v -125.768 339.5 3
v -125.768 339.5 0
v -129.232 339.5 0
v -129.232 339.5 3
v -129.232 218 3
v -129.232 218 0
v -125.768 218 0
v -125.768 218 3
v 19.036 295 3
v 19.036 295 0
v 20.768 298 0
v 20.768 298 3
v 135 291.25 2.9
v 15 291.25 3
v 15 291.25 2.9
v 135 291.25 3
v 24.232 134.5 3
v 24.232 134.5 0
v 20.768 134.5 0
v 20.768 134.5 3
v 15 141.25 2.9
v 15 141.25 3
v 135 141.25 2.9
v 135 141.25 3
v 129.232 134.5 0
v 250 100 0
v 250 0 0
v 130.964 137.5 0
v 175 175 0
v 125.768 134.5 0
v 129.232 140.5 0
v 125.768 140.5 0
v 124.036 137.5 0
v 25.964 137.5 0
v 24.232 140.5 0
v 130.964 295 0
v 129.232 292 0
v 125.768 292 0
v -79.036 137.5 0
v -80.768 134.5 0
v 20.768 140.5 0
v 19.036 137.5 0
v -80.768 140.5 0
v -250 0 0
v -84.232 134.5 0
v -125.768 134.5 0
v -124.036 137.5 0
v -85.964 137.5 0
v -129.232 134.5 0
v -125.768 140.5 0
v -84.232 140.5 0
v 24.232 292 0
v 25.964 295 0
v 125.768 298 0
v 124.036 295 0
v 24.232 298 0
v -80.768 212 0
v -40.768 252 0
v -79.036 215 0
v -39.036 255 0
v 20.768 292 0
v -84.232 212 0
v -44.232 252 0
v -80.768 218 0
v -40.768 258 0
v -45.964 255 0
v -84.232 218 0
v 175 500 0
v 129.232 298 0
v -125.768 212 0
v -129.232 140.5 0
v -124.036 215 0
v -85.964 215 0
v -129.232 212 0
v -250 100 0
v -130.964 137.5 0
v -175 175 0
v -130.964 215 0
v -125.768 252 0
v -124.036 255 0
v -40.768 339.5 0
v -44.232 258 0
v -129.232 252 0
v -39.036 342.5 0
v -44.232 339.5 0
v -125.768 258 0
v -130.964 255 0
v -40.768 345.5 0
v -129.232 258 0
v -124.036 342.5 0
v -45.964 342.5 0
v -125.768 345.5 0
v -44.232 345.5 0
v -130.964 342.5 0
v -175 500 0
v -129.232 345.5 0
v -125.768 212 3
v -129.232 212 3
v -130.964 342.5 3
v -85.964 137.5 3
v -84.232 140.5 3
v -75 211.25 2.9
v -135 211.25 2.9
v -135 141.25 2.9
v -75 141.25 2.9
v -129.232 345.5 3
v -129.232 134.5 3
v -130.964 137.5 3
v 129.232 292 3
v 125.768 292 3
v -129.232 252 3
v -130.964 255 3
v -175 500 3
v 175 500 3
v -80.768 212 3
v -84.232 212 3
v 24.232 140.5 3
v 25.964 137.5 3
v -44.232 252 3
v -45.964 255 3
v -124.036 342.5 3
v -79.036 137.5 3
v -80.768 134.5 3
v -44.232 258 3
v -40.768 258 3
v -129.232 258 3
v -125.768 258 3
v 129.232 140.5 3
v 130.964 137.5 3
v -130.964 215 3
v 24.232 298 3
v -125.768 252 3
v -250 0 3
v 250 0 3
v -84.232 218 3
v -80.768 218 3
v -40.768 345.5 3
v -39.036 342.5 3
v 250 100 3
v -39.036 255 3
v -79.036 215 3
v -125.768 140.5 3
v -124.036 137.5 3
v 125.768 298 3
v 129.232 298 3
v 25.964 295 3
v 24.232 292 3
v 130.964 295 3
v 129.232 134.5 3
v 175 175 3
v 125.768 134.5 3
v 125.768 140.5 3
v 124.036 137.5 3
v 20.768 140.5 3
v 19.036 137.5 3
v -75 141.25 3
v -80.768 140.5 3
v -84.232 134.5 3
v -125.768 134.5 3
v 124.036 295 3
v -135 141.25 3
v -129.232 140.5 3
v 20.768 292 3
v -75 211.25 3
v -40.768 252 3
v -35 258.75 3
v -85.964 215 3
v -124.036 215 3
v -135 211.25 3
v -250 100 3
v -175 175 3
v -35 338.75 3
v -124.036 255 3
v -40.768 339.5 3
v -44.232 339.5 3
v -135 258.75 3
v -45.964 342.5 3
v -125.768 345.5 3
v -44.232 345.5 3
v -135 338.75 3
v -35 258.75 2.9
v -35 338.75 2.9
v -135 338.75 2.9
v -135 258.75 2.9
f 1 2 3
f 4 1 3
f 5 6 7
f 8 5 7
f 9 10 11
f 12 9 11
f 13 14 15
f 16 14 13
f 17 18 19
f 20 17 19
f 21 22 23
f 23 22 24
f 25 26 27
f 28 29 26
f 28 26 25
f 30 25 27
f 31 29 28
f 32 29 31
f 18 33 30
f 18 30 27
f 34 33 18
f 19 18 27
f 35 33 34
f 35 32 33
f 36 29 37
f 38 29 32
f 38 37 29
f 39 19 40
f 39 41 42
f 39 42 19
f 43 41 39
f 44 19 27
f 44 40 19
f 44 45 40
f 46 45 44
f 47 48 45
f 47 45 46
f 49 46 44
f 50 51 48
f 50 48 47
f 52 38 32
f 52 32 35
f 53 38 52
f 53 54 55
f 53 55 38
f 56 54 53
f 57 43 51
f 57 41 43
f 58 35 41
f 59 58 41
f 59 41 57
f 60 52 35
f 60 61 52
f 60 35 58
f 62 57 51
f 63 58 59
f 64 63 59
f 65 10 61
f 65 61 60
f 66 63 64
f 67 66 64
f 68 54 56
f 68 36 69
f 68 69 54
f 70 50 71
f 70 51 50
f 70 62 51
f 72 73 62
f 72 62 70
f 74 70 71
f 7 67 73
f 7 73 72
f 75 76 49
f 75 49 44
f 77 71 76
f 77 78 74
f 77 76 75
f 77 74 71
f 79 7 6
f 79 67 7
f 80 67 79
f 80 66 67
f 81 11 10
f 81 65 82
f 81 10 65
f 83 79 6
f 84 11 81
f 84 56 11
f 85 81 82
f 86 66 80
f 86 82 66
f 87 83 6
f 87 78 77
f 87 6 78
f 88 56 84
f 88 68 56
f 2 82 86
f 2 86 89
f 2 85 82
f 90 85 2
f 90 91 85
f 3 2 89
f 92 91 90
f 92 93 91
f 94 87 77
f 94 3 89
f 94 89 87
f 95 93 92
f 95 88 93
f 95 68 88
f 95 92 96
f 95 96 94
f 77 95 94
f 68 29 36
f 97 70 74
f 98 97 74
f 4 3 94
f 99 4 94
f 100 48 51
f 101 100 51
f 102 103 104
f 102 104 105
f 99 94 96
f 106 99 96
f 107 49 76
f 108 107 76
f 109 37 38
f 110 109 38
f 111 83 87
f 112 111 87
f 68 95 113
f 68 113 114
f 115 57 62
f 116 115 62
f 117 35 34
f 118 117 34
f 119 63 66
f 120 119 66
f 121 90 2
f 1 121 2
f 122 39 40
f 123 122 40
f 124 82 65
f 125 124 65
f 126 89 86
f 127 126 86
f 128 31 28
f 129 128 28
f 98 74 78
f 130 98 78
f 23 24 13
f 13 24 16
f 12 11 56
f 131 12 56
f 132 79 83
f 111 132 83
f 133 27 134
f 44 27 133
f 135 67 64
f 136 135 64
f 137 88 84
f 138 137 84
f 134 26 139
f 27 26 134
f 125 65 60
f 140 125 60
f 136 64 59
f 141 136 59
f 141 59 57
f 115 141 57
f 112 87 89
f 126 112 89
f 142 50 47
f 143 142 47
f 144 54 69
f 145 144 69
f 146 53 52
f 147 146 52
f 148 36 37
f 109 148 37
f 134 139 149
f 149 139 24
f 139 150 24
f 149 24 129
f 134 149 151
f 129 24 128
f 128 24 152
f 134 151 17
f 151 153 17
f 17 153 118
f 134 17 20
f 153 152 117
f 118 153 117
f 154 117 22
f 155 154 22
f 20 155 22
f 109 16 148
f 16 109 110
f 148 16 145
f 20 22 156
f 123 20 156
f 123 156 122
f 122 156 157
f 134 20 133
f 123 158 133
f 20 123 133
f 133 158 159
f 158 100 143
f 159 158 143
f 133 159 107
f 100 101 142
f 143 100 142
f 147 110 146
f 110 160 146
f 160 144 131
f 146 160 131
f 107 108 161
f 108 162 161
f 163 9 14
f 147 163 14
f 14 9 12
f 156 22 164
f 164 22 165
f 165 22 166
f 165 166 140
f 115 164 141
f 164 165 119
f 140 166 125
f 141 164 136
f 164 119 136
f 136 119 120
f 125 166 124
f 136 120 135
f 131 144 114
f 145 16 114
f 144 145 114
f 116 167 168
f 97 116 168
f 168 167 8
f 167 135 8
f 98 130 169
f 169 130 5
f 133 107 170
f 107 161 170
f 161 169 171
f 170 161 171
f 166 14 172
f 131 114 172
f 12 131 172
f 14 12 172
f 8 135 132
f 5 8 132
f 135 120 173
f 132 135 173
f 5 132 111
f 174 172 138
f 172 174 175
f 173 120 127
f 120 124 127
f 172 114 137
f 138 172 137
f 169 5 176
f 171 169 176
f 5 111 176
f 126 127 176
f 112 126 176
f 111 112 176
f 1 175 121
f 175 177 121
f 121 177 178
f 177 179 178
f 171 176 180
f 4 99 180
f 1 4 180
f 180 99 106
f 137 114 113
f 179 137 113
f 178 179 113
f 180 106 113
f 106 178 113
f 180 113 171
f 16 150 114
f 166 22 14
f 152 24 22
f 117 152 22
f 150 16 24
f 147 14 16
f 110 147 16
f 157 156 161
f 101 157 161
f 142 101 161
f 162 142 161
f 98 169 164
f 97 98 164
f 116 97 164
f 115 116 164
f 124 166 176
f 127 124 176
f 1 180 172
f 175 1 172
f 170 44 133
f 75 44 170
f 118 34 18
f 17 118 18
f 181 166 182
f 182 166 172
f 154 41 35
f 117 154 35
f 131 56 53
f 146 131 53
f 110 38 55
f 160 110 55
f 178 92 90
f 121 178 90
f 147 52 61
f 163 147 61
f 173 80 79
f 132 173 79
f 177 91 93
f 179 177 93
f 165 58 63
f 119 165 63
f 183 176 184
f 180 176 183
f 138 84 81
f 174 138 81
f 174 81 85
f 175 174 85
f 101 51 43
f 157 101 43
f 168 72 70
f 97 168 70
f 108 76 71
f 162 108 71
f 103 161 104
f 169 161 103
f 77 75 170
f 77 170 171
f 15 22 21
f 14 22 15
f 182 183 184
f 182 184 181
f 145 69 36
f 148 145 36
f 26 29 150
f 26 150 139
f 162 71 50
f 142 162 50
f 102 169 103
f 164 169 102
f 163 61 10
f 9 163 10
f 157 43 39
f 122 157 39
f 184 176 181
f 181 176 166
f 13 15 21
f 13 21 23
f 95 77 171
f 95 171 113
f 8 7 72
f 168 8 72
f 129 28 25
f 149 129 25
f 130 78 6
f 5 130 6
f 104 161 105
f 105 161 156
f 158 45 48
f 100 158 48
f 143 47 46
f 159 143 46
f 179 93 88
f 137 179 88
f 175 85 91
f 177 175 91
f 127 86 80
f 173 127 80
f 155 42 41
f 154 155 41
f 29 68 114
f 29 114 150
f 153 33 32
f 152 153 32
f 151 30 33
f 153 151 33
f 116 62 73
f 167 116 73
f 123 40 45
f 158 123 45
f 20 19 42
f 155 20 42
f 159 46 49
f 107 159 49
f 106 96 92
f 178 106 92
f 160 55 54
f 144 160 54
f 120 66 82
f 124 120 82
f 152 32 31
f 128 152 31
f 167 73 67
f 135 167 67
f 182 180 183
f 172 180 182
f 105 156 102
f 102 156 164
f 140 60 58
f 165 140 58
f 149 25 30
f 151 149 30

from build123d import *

# Parameters (mm, degrees)
BOSS_EXTRUDE1_DEPTH = 3
CUT_EXTRUDE3_START  = 3
SKETCH3_W           = 100
SKETCH3_H           = 80
SKETCH3_W_2         = 120
SKETCH3_H_2         = 150
SKETCH3_W_3         = 60
SKETCH3_H_3         = 70
CUT_EXTRUDE3_DEPTH  = 0.1
CUT_EXTRUDE4_DEPTH  = 560.025044162


with BuildPart() as part:
    # Sketch1 → Boss-Extrude1 (new body)
    with BuildSketch(Plane.XY):
        Polygon((-250, 0), (-250, 100), (-175, 175), (-175, 500), (175, 500), (175, 175), (250, 100), (250, 0), align=None)
    extrude(amount=BOSS_EXTRUDE1_DEPTH)

    # Sketch3 → Cut-Extrude3 (cut)
    with BuildSketch(Plane.XY.offset(CUT_EXTRUDE3_START)):
        with Locations((-85, 298.75)):
            Rectangle(SKETCH3_W, SKETCH3_H)
        with Locations((75, 216.25)):
            Rectangle(SKETCH3_W_2, SKETCH3_H_2)
        with Locations((-105, 176.25)):
            Rectangle(SKETCH3_W_3, SKETCH3_H_3)
    extrude(amount=-CUT_EXTRUDE3_DEPTH, mode=Mode.SUBTRACT)

    # Sketch4 → Cut-Extrude4 (cut, through all)
    with BuildSketch(Plane(origin=(0, 0, 0), x_dir=(-1, 0, 0), z_dir=(0, 0, -1))):
        Polygon((-20.767949192, 140.5), (-24.232050808, 140.5), (-25.964101615, 137.5), (-24.232050808, 134.5), (-20.767949192, 134.5), (-19.035898385, 137.5), align=None)
        Polygon((-129.232050808, 134.5), (-125.767949192, 134.5), (-124.035898385, 137.5), (-125.767949192, 140.5), (-129.232050808, 140.5), (-130.964101615, 137.5), align=None)
        Polygon((79.035898385, 137.5), (80.767949192, 134.5), (84.232050808, 134.5), (85.964101615, 137.5), (84.232050808, 140.5), (80.767949192, 140.5), align=None)
        Polygon((129.232050808, 134.5), (130.964101615, 137.5), (129.232050808, 140.5), (125.767949192, 140.5), (124.035898385, 137.5), (125.767949192, 134.5), align=None)
        Polygon((129.232050808, 218), (125.767949192, 218), (124.035898385, 215), (125.767949192, 212), (129.232050808, 212), (130.964101615, 215), align=None)
        Polygon((80.767949192, 218), (79.035898385, 215), (80.767949192, 212), (84.232050808, 212), (85.964101615, 215), (84.232050808, 218), align=None)
        Polygon((125.767949192, 252), (129.232050808, 252), (130.964101615, 255), (129.232050808, 258), (125.767949192, 258), (124.035898385, 255), align=None)
        Polygon((44.232050808, 252), (45.964101615, 255), (44.232050808, 258), (40.767949192, 258), (39.035898385, 255), (40.767949192, 252), align=None)
        Polygon((-130.964101615, 295), (-129.232050808, 292), (-125.767949192, 292), (-124.035898385, 295), (-125.767949192, 298), (-129.232050808, 298), align=None)
        Polygon((-19.035898385, 295), (-20.767949192, 298), (-24.232050808, 298), (-25.964101615, 295), (-24.232050808, 292), (-20.767949192, 292), align=None)
        Polygon((40.767949192, 345.5), (39.035898385, 342.5), (40.767949192, 339.5), (44.232050808, 339.5), (45.964101615, 342.5), (44.232050808, 345.5), align=None)
        Polygon((129.232050808, 345.5), (125.767949192, 345.5), (124.035898385, 342.5), (125.767949192, 339.5), (129.232050808, 339.5), (130.964101615, 342.5), align=None)
    extrude(amount=-CUT_EXTRUDE4_DEPTH, mode=Mode.SUBTRACT)


solid = part.part
